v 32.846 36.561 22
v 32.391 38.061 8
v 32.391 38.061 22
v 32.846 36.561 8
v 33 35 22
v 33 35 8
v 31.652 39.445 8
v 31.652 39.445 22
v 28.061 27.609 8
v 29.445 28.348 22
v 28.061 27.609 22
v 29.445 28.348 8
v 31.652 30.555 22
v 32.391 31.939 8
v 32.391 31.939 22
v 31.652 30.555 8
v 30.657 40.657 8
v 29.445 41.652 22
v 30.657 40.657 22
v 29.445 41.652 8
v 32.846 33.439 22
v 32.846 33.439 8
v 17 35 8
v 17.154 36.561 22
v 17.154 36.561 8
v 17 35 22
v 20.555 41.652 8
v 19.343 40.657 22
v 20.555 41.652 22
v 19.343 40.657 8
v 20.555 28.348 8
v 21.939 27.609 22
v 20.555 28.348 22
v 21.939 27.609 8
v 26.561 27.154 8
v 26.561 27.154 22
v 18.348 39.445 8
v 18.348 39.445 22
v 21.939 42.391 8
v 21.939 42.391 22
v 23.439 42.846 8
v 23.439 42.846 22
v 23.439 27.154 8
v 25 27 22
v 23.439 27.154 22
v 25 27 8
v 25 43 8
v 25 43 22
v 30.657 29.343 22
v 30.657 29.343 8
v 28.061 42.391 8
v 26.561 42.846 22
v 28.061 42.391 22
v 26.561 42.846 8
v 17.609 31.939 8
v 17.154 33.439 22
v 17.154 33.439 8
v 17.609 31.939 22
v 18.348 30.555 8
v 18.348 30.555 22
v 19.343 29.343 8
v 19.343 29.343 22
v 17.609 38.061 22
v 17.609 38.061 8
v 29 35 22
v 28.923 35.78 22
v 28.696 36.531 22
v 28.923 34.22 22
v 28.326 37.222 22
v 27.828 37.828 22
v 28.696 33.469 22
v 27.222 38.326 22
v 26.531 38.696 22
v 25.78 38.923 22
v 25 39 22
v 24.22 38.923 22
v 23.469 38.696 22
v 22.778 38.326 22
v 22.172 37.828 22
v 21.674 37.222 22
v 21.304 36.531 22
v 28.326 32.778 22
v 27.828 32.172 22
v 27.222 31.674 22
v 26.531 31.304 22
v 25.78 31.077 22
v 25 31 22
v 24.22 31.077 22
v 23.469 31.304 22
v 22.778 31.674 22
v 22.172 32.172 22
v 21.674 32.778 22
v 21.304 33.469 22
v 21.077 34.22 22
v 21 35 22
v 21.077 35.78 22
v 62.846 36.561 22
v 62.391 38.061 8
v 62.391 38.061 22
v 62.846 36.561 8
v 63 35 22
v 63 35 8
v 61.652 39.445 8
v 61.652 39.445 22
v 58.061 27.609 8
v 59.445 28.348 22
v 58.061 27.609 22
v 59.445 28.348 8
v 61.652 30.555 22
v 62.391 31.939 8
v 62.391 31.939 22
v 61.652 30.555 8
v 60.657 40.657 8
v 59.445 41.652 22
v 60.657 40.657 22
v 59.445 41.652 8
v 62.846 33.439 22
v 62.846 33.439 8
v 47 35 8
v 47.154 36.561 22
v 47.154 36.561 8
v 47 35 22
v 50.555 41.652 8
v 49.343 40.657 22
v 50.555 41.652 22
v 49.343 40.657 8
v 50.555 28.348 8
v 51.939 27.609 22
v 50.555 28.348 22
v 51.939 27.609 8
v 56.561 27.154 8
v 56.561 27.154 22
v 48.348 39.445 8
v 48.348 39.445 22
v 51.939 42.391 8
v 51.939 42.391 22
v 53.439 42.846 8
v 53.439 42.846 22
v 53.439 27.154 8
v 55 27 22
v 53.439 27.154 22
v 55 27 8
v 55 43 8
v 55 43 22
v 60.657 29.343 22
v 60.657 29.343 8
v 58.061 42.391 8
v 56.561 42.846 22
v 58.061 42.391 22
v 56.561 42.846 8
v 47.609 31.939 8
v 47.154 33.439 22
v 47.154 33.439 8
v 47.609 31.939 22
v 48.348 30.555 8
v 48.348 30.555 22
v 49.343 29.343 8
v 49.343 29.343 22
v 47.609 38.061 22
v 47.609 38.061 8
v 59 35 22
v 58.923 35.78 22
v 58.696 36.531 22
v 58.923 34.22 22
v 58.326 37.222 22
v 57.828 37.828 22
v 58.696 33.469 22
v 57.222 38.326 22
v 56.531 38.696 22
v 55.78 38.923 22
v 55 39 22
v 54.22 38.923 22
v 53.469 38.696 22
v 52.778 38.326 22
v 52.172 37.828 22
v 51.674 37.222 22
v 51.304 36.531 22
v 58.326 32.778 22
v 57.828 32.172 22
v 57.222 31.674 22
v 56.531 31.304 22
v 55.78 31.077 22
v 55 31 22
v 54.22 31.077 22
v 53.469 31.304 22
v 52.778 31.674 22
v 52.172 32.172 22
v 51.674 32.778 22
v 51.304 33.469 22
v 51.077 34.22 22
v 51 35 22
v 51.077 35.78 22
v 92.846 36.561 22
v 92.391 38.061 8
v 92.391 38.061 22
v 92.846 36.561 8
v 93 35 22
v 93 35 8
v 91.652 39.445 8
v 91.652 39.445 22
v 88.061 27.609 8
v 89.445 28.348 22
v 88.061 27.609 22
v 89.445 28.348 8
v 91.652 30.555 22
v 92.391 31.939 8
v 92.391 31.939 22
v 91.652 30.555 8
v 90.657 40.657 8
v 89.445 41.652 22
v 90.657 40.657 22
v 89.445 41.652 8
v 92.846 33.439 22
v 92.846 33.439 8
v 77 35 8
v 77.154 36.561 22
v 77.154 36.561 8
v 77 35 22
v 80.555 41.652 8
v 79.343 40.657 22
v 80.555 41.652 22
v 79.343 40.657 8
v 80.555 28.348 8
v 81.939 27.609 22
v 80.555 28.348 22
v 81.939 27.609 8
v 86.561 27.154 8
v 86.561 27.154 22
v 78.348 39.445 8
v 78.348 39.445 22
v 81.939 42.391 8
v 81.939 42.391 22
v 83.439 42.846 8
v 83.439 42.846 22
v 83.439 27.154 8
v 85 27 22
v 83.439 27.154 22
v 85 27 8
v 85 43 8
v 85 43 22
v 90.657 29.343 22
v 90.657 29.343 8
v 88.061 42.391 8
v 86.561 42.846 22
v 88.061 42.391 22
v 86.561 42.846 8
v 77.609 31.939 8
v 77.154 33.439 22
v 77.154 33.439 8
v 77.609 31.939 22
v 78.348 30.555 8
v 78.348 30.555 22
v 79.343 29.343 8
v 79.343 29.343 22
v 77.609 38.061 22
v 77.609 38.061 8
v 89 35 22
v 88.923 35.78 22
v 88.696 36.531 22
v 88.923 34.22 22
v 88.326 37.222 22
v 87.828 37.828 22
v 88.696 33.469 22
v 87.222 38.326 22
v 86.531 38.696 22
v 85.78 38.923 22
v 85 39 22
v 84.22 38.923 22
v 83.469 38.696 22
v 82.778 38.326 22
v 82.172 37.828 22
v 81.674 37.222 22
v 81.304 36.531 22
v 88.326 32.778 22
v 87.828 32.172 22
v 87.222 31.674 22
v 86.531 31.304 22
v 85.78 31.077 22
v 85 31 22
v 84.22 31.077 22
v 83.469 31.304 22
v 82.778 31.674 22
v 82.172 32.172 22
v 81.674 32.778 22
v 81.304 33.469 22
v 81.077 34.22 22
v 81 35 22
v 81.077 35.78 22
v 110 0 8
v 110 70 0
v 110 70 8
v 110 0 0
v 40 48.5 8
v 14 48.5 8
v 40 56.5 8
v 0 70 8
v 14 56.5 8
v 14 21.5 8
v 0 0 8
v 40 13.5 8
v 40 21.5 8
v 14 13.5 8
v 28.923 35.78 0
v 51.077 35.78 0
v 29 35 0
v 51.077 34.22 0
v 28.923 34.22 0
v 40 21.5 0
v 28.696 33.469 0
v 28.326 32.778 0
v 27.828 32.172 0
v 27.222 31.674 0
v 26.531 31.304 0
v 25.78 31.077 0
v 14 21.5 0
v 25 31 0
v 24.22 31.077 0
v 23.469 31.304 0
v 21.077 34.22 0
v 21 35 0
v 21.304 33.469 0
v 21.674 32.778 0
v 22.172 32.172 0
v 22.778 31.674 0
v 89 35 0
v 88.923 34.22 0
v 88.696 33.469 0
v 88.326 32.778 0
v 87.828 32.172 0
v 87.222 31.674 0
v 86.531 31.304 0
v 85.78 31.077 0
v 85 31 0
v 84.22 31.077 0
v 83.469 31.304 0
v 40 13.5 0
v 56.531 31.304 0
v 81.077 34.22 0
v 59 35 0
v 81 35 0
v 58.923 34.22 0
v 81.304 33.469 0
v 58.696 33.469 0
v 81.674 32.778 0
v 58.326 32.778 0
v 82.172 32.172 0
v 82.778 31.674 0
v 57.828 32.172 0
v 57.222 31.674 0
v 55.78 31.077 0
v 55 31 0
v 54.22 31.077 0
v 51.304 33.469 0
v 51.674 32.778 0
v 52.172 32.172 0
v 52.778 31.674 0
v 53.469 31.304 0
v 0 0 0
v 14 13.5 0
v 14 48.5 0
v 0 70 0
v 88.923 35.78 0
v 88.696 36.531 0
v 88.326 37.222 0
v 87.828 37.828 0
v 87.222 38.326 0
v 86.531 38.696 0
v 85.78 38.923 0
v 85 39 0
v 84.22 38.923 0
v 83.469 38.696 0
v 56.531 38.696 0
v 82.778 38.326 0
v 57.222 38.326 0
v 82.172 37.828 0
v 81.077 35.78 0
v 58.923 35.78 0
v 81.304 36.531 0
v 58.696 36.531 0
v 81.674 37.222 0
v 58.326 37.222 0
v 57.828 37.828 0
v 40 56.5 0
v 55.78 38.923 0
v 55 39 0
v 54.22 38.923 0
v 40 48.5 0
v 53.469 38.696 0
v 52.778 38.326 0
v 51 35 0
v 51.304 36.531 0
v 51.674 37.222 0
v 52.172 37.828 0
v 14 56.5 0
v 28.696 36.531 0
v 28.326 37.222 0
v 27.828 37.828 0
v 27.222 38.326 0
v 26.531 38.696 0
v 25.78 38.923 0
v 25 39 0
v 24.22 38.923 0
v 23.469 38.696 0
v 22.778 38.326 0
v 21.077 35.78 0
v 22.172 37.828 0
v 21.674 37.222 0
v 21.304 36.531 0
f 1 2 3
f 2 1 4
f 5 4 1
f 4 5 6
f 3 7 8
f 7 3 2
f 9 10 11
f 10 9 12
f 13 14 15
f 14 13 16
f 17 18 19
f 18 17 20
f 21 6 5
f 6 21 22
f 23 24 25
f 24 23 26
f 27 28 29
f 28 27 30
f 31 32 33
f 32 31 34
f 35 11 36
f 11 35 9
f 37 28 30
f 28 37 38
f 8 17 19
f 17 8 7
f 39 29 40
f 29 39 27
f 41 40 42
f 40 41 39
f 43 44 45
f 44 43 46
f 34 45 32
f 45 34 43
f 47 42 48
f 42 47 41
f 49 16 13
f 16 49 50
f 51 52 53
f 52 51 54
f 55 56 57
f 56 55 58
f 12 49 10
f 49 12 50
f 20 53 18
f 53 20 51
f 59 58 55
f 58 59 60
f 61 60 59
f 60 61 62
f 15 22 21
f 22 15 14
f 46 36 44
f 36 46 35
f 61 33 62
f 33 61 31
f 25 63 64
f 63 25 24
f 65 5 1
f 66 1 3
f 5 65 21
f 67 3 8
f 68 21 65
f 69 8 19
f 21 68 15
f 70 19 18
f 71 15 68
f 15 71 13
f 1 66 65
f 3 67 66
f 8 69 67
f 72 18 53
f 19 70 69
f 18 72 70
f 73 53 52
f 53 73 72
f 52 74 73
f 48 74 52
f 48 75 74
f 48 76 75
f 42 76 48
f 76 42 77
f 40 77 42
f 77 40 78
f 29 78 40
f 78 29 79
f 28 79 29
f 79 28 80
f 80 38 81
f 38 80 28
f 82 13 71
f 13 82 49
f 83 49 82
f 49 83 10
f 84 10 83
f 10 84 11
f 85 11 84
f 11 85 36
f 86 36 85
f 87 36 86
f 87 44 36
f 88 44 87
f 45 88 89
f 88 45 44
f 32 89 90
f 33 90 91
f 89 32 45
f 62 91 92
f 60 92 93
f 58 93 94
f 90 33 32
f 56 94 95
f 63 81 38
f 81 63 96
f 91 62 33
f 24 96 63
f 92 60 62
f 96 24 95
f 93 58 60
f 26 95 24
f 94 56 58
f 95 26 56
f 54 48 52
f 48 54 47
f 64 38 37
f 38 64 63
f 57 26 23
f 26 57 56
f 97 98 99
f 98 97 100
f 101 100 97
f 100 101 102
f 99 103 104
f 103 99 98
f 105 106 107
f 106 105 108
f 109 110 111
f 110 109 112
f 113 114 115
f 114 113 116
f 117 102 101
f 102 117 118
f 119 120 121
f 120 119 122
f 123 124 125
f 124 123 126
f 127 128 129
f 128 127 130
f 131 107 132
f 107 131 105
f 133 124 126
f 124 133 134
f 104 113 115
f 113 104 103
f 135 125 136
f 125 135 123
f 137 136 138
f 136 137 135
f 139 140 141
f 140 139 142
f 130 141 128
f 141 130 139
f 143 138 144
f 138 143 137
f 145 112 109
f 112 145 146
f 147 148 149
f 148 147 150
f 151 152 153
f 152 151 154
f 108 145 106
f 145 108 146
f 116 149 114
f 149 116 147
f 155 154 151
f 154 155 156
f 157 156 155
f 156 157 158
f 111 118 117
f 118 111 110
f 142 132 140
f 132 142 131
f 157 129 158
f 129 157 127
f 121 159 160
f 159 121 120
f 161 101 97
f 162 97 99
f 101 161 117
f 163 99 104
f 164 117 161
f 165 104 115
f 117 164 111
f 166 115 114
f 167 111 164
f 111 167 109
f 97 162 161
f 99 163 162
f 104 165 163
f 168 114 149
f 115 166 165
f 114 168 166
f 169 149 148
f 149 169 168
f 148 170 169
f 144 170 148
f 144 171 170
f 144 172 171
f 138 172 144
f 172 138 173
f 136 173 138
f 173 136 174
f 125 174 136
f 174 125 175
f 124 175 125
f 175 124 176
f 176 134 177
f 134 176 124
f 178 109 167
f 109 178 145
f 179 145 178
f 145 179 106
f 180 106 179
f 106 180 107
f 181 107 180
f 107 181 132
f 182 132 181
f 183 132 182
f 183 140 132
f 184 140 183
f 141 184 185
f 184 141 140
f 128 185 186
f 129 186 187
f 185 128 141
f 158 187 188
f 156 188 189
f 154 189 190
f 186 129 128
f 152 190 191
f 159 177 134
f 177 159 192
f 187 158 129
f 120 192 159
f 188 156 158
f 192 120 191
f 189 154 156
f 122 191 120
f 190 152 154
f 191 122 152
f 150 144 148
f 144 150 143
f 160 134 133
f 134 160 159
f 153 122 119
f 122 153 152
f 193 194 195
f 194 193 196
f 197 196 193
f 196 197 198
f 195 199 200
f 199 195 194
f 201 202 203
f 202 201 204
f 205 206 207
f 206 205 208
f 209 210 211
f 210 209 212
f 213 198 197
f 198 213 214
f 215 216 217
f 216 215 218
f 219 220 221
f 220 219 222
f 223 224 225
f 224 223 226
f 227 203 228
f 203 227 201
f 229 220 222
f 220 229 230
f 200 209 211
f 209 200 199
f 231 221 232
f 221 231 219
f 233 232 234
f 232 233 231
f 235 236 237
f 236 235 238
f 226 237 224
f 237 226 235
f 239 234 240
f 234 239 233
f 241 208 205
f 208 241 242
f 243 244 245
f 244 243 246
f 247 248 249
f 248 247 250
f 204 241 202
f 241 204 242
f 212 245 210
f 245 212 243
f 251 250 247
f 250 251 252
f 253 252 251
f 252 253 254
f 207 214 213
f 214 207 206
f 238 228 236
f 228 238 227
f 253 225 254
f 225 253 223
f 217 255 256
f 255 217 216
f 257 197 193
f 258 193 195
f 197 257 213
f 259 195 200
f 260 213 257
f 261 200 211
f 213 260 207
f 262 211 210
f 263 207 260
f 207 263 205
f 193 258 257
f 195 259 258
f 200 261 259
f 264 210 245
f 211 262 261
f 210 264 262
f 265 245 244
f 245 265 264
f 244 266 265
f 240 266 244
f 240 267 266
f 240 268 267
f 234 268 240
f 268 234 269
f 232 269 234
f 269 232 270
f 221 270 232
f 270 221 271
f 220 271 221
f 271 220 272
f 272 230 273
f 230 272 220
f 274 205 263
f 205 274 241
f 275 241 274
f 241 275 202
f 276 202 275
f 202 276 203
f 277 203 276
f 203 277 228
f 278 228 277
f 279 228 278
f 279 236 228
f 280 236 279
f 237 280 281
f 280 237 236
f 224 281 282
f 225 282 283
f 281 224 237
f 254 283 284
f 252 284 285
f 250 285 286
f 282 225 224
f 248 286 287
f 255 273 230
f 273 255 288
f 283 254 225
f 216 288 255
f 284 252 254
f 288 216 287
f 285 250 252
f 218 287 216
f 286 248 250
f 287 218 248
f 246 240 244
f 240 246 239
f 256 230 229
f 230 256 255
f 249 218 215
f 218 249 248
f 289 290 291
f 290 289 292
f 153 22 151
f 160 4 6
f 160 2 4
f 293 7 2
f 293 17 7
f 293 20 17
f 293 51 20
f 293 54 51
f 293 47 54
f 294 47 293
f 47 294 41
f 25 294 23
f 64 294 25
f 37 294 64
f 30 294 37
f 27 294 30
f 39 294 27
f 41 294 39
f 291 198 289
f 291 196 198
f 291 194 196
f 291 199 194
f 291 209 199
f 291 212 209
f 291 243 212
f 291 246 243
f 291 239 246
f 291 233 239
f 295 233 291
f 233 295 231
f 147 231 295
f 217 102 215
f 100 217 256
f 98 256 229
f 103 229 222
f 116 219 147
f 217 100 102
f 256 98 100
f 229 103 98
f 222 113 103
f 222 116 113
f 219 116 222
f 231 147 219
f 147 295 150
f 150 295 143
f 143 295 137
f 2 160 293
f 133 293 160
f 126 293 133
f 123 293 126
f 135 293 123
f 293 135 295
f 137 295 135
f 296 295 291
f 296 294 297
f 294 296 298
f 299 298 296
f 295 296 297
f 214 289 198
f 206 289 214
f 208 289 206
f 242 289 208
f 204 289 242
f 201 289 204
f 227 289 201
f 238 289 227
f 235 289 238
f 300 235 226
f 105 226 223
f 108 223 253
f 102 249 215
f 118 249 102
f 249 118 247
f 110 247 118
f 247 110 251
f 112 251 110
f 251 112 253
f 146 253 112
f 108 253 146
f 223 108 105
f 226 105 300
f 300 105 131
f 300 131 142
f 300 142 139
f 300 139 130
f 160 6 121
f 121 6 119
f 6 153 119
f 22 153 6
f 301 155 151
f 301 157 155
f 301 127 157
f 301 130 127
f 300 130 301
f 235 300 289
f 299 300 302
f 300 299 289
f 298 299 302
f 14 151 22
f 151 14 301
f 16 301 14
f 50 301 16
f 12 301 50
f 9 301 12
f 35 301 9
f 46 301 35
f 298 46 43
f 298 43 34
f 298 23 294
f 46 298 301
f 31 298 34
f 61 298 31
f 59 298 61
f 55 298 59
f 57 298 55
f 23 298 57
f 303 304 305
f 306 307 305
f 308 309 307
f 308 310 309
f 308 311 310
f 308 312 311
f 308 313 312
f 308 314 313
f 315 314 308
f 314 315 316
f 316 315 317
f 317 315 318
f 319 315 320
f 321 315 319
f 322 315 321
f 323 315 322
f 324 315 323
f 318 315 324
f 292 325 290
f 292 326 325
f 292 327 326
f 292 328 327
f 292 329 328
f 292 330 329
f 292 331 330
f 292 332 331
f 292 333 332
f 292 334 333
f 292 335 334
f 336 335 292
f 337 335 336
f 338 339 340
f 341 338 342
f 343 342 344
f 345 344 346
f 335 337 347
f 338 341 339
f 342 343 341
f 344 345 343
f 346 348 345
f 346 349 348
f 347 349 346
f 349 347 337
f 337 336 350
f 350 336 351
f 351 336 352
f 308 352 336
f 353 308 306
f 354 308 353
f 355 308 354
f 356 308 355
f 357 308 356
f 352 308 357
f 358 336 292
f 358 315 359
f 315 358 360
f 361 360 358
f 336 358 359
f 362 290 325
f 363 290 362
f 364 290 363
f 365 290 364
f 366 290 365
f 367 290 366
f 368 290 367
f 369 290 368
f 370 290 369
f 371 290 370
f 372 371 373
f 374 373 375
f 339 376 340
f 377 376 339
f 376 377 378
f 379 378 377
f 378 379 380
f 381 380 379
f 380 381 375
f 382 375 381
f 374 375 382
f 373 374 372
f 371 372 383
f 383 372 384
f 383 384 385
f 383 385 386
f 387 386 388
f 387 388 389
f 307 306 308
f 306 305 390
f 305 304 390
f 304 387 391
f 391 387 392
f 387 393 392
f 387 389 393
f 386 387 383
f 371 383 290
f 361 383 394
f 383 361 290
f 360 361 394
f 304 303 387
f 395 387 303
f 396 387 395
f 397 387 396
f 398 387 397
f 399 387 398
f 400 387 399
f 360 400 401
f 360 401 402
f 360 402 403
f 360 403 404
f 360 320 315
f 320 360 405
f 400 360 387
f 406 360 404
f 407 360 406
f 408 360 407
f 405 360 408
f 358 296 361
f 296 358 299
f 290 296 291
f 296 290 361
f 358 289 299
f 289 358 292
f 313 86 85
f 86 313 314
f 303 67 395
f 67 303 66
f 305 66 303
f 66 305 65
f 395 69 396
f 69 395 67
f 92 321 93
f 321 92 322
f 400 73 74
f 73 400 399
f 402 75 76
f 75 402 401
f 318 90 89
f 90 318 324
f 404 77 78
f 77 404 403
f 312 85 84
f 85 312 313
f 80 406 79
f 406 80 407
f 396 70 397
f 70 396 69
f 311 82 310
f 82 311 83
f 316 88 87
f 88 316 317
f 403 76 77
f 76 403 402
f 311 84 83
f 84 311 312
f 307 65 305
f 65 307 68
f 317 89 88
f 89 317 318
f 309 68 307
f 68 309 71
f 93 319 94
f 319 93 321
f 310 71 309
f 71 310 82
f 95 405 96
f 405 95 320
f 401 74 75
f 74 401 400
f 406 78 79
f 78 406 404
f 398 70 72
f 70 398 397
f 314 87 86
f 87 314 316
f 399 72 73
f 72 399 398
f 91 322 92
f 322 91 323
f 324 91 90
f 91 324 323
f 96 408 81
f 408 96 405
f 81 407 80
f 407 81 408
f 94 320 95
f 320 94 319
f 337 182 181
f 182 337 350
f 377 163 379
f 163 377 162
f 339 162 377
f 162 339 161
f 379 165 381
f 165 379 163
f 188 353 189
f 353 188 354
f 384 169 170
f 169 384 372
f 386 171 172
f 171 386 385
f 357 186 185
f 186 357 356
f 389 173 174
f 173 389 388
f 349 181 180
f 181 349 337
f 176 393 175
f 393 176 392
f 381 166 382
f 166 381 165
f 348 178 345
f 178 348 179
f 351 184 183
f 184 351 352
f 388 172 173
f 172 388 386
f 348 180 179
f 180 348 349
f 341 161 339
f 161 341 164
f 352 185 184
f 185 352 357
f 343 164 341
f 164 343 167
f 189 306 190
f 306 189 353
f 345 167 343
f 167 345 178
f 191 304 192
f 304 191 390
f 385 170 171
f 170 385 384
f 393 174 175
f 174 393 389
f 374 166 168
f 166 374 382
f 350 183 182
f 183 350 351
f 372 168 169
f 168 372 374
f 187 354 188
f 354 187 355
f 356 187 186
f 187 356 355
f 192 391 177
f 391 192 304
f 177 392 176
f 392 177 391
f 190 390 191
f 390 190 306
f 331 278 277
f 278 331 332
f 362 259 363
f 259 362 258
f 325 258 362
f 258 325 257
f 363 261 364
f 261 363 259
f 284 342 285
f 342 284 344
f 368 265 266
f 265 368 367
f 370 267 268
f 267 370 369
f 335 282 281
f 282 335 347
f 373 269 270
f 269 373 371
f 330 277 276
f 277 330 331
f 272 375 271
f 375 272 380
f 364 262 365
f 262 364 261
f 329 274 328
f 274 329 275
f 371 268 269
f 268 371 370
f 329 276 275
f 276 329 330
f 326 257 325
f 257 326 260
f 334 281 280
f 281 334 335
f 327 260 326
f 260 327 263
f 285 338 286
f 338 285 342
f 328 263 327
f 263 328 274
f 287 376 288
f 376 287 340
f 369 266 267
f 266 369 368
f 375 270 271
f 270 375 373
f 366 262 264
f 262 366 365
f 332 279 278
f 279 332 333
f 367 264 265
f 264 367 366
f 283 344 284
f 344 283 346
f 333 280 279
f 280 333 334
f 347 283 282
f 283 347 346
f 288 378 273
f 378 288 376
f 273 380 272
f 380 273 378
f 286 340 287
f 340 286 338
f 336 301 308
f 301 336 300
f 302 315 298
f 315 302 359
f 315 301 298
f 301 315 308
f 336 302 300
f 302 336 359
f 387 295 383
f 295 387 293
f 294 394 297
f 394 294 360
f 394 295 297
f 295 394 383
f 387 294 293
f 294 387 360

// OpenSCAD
$fn = 32;

// ----------------------------------------------------------------------
// Drill jig: three_boss_slot jig
// ----------------------------------------------------------------------

// --- parameters (mm) ---
plate_l = 110;            // plate length, X
plate_w = 70;             // plate width, Y
plate_t = 8;              // plate thickness
boss_d = 16;              // guide boss diameter
boss_h = 15;              // boss height above the plate
guide_d = 8;              // guide hole diameter
boss_pitch = 30;          // boss pitch
slot_w = 8;               // clamp slot width
slot_l = 26;              // clamp slot length
slot_x = 14;              // slot start X

n_boss = 3;  // guide bosses
boss_x0 = (plate_l - (n_boss - 1) * boss_pitch) / 2;  // first boss X
boss_top = plate_t - 1 + boss_h;  // boss crown height
total_h = boss_top;  // overall height

difference() {
  union() {
  cube([plate_l, plate_w, plate_t]);
  for (i = [0 : n_boss - 1])
    translate([boss_x0 + i * boss_pitch, plate_w / 2, plate_t - 1])
      cylinder(h = boss_h, d = boss_d);
  }
  for (i = [0 : n_boss - 1])
    translate([boss_x0 + i * boss_pitch, plate_w / 2, -1])
      cylinder(h = plate_t + boss_h, d = guide_d);
  for (cy = [plate_w * 0.25, plate_w * 0.75])
    translate([slot_x, cy - slot_w / 2, -1])
      cube([slot_l, slot_w, plate_t + 2]);
}
